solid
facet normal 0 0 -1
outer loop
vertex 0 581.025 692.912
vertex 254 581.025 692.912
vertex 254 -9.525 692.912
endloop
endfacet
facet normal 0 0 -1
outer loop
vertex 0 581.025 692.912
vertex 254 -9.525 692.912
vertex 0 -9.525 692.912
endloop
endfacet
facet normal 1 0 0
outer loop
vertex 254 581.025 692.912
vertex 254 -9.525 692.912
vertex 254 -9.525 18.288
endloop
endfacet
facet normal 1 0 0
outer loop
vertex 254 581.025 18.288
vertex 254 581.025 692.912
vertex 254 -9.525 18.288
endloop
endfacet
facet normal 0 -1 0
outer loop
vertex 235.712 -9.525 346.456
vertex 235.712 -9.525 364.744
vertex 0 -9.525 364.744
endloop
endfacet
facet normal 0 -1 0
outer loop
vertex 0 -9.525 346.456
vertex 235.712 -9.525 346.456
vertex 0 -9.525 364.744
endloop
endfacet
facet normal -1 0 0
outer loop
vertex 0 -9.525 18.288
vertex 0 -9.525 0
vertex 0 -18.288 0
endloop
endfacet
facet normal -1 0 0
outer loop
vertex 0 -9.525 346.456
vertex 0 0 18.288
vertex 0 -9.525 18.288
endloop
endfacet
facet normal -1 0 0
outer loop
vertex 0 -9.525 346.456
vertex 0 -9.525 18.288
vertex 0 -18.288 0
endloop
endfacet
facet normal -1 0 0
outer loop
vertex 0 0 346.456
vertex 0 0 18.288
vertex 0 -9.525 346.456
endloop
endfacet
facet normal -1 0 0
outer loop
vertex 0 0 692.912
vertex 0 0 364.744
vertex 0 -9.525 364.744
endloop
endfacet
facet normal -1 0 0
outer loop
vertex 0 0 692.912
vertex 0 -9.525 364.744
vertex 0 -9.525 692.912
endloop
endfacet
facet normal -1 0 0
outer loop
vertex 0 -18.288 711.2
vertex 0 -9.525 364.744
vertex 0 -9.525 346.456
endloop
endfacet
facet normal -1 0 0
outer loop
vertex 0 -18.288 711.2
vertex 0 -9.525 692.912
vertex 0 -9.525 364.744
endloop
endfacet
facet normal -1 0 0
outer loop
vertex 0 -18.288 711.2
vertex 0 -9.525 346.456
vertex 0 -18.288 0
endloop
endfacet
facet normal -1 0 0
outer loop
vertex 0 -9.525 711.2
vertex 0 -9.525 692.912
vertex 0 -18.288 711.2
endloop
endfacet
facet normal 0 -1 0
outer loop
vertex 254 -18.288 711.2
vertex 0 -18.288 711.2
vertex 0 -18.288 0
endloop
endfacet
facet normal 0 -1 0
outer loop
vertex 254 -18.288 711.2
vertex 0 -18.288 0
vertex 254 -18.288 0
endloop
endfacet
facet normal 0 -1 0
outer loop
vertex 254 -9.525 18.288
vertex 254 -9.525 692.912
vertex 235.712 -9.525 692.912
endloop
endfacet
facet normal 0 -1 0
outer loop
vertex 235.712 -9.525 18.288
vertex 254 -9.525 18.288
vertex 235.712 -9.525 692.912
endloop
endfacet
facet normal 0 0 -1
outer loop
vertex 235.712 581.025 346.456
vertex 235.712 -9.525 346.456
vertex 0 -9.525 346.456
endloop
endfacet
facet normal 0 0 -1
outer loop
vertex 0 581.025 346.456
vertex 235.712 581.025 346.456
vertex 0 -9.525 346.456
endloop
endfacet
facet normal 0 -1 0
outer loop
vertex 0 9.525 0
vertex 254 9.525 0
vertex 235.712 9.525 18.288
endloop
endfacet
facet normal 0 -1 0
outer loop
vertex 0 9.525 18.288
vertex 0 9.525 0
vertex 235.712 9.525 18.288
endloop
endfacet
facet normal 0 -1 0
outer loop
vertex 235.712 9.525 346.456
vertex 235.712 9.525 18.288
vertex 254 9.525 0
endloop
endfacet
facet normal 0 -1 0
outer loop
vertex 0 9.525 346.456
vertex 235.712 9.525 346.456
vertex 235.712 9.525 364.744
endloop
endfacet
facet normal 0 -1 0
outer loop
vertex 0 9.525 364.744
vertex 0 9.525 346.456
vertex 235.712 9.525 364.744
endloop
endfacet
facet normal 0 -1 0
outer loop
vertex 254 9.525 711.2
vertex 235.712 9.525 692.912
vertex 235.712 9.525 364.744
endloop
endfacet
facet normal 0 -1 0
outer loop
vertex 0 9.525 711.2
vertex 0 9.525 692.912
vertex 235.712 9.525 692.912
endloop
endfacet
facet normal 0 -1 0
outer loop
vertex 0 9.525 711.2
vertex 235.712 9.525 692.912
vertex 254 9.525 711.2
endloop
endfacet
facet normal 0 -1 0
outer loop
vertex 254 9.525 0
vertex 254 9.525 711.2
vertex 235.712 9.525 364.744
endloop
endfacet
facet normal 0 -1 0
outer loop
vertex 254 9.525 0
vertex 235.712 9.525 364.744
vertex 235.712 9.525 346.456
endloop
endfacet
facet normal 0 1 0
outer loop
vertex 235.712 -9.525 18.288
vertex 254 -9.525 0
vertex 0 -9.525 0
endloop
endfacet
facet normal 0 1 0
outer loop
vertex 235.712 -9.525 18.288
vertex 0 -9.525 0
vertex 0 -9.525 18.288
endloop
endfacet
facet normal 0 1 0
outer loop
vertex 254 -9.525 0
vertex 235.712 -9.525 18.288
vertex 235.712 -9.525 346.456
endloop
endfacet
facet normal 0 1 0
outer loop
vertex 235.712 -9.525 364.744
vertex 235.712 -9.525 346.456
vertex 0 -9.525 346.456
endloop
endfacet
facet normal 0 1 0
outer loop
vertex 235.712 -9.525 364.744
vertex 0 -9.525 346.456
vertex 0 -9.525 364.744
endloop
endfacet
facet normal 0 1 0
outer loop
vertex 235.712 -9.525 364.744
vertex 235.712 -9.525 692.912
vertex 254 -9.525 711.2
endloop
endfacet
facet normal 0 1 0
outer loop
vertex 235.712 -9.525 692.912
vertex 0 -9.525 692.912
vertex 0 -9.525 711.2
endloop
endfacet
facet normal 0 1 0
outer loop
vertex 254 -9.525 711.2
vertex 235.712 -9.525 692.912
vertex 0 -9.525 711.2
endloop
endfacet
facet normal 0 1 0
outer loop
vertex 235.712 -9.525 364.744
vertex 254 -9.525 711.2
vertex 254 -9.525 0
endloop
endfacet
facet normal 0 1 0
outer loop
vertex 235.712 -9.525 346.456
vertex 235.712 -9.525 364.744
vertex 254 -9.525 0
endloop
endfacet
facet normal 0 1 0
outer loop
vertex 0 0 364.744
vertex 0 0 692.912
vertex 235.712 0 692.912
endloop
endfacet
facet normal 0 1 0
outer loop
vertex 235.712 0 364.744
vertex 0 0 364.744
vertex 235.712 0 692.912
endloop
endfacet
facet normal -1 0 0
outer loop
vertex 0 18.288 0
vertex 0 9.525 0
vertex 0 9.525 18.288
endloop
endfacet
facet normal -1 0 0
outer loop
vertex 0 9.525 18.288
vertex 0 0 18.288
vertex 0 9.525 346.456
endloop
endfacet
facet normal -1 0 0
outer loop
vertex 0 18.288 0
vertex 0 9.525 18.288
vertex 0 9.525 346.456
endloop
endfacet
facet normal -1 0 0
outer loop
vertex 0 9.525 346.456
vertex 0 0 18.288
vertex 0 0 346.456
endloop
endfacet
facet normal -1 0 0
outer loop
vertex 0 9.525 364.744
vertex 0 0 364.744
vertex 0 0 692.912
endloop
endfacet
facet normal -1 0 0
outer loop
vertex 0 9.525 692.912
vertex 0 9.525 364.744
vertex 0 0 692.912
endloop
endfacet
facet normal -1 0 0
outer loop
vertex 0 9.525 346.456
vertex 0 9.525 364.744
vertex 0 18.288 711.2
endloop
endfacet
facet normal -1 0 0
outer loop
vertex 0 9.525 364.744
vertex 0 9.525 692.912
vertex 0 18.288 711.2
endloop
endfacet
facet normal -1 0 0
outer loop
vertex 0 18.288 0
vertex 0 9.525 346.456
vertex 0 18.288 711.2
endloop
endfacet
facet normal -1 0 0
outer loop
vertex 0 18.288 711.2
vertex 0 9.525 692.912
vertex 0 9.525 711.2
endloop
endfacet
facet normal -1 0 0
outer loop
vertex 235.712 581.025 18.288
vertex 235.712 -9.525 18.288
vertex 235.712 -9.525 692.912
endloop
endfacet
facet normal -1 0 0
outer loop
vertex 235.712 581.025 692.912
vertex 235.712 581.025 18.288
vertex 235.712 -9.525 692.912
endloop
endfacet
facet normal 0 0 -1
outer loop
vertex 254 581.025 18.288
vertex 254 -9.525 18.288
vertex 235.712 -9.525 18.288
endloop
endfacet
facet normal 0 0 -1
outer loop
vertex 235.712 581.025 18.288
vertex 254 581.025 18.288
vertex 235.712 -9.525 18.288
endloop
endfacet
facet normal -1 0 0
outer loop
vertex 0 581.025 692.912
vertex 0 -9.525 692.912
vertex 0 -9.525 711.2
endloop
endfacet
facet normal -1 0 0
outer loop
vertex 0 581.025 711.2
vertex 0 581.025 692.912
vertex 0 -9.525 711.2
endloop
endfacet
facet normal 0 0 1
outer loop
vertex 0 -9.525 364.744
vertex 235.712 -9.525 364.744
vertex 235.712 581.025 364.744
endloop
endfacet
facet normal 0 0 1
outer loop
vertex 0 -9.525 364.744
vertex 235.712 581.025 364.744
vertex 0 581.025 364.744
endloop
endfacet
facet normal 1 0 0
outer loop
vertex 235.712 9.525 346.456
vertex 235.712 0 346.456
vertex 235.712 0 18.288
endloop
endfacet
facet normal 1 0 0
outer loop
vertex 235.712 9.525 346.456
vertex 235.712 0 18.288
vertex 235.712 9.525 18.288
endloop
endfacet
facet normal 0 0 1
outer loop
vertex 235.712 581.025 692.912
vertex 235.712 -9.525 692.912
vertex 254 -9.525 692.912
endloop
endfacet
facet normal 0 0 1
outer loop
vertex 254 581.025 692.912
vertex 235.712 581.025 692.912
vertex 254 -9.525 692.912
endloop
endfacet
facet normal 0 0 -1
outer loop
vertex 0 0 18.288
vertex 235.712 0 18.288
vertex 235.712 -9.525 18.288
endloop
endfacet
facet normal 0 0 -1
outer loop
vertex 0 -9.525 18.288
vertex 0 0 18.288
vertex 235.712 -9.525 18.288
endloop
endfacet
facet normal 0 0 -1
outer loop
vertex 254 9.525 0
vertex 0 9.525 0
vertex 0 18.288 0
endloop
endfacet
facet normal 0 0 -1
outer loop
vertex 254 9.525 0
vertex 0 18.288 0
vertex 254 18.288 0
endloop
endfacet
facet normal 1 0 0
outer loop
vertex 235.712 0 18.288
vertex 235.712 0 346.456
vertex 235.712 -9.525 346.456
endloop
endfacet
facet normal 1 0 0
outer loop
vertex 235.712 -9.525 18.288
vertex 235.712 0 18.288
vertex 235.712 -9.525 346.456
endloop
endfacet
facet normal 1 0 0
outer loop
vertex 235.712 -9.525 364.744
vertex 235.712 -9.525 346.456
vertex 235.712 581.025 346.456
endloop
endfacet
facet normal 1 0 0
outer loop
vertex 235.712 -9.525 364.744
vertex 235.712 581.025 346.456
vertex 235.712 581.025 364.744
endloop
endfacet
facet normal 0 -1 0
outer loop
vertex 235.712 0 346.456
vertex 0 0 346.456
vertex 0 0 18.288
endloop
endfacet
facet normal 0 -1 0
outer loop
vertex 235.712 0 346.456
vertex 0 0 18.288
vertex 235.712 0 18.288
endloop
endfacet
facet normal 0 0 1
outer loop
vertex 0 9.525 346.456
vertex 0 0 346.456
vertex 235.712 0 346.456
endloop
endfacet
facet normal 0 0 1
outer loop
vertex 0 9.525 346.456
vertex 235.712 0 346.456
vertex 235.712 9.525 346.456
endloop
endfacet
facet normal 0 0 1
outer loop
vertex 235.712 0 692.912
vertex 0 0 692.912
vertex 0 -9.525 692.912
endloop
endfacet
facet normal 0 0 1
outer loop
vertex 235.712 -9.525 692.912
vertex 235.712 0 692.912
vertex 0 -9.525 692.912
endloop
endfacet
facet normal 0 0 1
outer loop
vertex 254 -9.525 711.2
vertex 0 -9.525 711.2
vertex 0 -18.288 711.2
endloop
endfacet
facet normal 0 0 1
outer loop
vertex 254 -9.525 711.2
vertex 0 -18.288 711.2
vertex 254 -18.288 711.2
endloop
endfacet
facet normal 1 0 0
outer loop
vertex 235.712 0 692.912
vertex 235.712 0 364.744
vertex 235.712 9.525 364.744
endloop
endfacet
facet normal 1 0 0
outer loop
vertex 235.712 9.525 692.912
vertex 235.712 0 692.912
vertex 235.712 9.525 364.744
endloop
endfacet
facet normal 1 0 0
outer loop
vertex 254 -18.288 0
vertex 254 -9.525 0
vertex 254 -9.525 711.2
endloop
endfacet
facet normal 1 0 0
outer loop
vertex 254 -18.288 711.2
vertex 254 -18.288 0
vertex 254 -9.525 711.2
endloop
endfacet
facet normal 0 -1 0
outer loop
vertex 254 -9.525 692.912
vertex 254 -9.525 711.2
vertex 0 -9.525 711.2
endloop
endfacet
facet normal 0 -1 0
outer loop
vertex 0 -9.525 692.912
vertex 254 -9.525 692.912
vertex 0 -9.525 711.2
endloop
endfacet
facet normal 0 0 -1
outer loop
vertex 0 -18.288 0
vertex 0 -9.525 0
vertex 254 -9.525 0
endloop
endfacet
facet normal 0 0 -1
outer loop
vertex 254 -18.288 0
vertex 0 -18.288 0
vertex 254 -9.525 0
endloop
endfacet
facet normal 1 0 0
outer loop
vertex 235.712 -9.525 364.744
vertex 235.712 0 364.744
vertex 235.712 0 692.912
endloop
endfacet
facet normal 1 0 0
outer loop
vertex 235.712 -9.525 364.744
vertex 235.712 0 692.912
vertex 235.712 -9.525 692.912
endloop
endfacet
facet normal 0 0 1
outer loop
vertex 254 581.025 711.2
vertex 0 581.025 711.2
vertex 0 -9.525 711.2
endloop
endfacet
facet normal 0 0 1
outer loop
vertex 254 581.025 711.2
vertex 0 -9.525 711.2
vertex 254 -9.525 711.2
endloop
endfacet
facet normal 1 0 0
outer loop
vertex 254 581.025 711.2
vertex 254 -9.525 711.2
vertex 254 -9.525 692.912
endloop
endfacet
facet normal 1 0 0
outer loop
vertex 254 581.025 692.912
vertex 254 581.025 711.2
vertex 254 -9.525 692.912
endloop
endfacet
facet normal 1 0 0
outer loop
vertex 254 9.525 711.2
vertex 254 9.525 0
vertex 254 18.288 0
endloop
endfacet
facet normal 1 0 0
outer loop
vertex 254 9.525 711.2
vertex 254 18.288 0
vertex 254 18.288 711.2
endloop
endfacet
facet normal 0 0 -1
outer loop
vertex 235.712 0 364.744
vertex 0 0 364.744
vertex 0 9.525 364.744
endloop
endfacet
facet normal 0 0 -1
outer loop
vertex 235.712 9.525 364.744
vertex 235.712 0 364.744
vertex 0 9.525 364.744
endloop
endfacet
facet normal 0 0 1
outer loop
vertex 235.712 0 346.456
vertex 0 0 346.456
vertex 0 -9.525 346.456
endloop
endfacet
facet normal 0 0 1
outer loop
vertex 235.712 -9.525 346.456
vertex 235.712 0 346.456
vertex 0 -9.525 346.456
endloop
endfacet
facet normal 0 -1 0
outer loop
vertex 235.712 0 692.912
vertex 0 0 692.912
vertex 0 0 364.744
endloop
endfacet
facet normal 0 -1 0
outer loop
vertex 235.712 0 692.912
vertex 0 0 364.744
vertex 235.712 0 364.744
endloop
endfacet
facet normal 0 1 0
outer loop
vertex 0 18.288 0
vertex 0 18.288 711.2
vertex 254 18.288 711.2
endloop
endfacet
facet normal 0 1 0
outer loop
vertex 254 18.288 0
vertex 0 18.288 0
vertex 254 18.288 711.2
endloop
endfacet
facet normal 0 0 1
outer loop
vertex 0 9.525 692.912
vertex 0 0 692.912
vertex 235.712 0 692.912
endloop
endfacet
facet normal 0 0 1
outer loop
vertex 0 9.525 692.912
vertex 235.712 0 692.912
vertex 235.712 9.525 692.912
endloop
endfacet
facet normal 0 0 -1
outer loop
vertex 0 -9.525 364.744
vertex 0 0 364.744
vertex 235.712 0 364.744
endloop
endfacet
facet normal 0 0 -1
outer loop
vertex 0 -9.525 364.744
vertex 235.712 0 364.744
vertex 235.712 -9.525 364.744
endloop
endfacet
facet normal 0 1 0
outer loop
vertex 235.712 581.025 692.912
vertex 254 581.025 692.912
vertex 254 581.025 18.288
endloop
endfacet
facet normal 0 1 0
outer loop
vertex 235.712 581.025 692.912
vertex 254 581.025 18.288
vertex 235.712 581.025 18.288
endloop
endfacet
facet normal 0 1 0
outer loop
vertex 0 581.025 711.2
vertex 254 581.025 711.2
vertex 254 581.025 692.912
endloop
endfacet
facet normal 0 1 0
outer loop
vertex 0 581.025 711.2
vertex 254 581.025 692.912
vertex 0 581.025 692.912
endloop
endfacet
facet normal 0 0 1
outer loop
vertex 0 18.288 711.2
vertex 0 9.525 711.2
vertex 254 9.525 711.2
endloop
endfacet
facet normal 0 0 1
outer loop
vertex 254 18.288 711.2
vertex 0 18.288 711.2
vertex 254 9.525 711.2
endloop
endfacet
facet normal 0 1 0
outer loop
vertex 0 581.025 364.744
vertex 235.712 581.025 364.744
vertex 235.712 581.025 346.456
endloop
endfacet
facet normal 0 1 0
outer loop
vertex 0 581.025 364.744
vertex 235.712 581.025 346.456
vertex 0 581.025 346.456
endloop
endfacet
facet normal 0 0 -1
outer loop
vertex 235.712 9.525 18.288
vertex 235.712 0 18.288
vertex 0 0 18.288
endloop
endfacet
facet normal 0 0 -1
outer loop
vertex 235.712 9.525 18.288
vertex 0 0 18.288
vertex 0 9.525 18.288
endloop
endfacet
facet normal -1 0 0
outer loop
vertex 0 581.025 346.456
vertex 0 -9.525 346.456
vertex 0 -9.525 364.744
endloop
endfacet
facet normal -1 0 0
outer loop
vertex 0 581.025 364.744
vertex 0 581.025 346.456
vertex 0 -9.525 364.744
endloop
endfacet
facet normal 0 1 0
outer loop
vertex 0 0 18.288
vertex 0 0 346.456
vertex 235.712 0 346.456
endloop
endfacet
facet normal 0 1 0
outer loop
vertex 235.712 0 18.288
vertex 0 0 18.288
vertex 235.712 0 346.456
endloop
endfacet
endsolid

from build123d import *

# Parameters (mm, degrees)
F0_W      = 254
F0_H      = 711.2
F1_DEPTH  = 18.288
F2_W      = 9.525
F2_H      = 18.288
F4_W      = 9.525
F4_H      = 18.288
F5_DEPTH  = 235.712
F7_DEPTH  = 590.55
F9_DEPTH  = 590.55
F10_W     = 235.712
F10_H     = 18.288
F11_DEPTH = 590.55


with BuildPart() as f1:
    # F0 (on Front) → F1 (new body)
    with BuildSketch(Plane.XZ):
        with Locations((127, 355.6)):
            Rectangle(F0_W, F0_H)
    extrude(amount=F1_DEPTH)

    # F3: sweep along a path in F3_path
    with BuildLine(Plane(origin=(0, 0, 711.2), x_dir=(0, 0, 1), z_dir=(0, -1, 0))) as f3_path:
        Line((0, 0), (0, -254))
        Line((0, -254), (-711.2, -254))
        Line((-711.2, -254), (-711.2, 0))
    # F2 (on face) → F3 (sweep, cut)
    with BuildSketch(Plane(origin=(0, 0, 0), x_dir=(0, -1, 0), z_dir=(-1, 0, 0))):
        with Locations((4.7625, 702.056)):
            Rectangle(F2_W, F2_H)
    sweep(path=f3_path.line, transition=Transition.RIGHT, mode=Mode.SUBTRACT)

    # F4 (on face) → F5 (cut, through all)
    with BuildSketch(Plane(origin=(0, 0, 0), x_dir=(0, -1, 0), z_dir=(-1, 0, 0))):
        with Locations((4.7625, 355.6)):
            Rectangle(F4_W, F4_H)
    extrude(amount=-F5_DEPTH, mode=Mode.SUBTRACT)


with BuildPart() as f7:
    # F6 (on face) → F7 (new body)
    with BuildSketch(Plane(origin=(0, -9.525, 0), x_dir=(-1, 0, 0), z_dir=(0, 1, 0))):
        Polygon((0, 692.912), (0, 711.2), (-254, 711.2), (-254, 692.912), (-235.712, 692.912), align=None)
    extrude(amount=F7_DEPTH)


with BuildPart() as f9:
    # F8 (on face) → F9 (new body, through all)
    with BuildSketch(Plane(origin=(0, -9.525, 0), x_dir=(-1, 0, 0), z_dir=(0, 1, 0))):
        Polygon((-235.712, 364.744), (-235.712, 692.912), (-254, 692.912), (-254, 18.288), (-235.712, 18.288), (-235.712, 346.456), align=None)
    extrude(amount=F9_DEPTH)


with BuildPart() as f11:
    # F10 (on face) → F11 (new body, through all)
    with BuildSketch(Plane(origin=(0, -9.525, 0), x_dir=(-1, 0, 0), z_dir=(0, 1, 0))):
        with Locations((-117.856, 355.6)):
            Rectangle(F10_W, F10_H)
    extrude(amount=F11_DEPTH)


with BuildPart() as f12_1:
    # F12: instance of F1
    add(f1.part.mirror(Plane.XZ))


solid = Compound([f1.part, f7.part, f9.part, f11.part, f12_1.part])
